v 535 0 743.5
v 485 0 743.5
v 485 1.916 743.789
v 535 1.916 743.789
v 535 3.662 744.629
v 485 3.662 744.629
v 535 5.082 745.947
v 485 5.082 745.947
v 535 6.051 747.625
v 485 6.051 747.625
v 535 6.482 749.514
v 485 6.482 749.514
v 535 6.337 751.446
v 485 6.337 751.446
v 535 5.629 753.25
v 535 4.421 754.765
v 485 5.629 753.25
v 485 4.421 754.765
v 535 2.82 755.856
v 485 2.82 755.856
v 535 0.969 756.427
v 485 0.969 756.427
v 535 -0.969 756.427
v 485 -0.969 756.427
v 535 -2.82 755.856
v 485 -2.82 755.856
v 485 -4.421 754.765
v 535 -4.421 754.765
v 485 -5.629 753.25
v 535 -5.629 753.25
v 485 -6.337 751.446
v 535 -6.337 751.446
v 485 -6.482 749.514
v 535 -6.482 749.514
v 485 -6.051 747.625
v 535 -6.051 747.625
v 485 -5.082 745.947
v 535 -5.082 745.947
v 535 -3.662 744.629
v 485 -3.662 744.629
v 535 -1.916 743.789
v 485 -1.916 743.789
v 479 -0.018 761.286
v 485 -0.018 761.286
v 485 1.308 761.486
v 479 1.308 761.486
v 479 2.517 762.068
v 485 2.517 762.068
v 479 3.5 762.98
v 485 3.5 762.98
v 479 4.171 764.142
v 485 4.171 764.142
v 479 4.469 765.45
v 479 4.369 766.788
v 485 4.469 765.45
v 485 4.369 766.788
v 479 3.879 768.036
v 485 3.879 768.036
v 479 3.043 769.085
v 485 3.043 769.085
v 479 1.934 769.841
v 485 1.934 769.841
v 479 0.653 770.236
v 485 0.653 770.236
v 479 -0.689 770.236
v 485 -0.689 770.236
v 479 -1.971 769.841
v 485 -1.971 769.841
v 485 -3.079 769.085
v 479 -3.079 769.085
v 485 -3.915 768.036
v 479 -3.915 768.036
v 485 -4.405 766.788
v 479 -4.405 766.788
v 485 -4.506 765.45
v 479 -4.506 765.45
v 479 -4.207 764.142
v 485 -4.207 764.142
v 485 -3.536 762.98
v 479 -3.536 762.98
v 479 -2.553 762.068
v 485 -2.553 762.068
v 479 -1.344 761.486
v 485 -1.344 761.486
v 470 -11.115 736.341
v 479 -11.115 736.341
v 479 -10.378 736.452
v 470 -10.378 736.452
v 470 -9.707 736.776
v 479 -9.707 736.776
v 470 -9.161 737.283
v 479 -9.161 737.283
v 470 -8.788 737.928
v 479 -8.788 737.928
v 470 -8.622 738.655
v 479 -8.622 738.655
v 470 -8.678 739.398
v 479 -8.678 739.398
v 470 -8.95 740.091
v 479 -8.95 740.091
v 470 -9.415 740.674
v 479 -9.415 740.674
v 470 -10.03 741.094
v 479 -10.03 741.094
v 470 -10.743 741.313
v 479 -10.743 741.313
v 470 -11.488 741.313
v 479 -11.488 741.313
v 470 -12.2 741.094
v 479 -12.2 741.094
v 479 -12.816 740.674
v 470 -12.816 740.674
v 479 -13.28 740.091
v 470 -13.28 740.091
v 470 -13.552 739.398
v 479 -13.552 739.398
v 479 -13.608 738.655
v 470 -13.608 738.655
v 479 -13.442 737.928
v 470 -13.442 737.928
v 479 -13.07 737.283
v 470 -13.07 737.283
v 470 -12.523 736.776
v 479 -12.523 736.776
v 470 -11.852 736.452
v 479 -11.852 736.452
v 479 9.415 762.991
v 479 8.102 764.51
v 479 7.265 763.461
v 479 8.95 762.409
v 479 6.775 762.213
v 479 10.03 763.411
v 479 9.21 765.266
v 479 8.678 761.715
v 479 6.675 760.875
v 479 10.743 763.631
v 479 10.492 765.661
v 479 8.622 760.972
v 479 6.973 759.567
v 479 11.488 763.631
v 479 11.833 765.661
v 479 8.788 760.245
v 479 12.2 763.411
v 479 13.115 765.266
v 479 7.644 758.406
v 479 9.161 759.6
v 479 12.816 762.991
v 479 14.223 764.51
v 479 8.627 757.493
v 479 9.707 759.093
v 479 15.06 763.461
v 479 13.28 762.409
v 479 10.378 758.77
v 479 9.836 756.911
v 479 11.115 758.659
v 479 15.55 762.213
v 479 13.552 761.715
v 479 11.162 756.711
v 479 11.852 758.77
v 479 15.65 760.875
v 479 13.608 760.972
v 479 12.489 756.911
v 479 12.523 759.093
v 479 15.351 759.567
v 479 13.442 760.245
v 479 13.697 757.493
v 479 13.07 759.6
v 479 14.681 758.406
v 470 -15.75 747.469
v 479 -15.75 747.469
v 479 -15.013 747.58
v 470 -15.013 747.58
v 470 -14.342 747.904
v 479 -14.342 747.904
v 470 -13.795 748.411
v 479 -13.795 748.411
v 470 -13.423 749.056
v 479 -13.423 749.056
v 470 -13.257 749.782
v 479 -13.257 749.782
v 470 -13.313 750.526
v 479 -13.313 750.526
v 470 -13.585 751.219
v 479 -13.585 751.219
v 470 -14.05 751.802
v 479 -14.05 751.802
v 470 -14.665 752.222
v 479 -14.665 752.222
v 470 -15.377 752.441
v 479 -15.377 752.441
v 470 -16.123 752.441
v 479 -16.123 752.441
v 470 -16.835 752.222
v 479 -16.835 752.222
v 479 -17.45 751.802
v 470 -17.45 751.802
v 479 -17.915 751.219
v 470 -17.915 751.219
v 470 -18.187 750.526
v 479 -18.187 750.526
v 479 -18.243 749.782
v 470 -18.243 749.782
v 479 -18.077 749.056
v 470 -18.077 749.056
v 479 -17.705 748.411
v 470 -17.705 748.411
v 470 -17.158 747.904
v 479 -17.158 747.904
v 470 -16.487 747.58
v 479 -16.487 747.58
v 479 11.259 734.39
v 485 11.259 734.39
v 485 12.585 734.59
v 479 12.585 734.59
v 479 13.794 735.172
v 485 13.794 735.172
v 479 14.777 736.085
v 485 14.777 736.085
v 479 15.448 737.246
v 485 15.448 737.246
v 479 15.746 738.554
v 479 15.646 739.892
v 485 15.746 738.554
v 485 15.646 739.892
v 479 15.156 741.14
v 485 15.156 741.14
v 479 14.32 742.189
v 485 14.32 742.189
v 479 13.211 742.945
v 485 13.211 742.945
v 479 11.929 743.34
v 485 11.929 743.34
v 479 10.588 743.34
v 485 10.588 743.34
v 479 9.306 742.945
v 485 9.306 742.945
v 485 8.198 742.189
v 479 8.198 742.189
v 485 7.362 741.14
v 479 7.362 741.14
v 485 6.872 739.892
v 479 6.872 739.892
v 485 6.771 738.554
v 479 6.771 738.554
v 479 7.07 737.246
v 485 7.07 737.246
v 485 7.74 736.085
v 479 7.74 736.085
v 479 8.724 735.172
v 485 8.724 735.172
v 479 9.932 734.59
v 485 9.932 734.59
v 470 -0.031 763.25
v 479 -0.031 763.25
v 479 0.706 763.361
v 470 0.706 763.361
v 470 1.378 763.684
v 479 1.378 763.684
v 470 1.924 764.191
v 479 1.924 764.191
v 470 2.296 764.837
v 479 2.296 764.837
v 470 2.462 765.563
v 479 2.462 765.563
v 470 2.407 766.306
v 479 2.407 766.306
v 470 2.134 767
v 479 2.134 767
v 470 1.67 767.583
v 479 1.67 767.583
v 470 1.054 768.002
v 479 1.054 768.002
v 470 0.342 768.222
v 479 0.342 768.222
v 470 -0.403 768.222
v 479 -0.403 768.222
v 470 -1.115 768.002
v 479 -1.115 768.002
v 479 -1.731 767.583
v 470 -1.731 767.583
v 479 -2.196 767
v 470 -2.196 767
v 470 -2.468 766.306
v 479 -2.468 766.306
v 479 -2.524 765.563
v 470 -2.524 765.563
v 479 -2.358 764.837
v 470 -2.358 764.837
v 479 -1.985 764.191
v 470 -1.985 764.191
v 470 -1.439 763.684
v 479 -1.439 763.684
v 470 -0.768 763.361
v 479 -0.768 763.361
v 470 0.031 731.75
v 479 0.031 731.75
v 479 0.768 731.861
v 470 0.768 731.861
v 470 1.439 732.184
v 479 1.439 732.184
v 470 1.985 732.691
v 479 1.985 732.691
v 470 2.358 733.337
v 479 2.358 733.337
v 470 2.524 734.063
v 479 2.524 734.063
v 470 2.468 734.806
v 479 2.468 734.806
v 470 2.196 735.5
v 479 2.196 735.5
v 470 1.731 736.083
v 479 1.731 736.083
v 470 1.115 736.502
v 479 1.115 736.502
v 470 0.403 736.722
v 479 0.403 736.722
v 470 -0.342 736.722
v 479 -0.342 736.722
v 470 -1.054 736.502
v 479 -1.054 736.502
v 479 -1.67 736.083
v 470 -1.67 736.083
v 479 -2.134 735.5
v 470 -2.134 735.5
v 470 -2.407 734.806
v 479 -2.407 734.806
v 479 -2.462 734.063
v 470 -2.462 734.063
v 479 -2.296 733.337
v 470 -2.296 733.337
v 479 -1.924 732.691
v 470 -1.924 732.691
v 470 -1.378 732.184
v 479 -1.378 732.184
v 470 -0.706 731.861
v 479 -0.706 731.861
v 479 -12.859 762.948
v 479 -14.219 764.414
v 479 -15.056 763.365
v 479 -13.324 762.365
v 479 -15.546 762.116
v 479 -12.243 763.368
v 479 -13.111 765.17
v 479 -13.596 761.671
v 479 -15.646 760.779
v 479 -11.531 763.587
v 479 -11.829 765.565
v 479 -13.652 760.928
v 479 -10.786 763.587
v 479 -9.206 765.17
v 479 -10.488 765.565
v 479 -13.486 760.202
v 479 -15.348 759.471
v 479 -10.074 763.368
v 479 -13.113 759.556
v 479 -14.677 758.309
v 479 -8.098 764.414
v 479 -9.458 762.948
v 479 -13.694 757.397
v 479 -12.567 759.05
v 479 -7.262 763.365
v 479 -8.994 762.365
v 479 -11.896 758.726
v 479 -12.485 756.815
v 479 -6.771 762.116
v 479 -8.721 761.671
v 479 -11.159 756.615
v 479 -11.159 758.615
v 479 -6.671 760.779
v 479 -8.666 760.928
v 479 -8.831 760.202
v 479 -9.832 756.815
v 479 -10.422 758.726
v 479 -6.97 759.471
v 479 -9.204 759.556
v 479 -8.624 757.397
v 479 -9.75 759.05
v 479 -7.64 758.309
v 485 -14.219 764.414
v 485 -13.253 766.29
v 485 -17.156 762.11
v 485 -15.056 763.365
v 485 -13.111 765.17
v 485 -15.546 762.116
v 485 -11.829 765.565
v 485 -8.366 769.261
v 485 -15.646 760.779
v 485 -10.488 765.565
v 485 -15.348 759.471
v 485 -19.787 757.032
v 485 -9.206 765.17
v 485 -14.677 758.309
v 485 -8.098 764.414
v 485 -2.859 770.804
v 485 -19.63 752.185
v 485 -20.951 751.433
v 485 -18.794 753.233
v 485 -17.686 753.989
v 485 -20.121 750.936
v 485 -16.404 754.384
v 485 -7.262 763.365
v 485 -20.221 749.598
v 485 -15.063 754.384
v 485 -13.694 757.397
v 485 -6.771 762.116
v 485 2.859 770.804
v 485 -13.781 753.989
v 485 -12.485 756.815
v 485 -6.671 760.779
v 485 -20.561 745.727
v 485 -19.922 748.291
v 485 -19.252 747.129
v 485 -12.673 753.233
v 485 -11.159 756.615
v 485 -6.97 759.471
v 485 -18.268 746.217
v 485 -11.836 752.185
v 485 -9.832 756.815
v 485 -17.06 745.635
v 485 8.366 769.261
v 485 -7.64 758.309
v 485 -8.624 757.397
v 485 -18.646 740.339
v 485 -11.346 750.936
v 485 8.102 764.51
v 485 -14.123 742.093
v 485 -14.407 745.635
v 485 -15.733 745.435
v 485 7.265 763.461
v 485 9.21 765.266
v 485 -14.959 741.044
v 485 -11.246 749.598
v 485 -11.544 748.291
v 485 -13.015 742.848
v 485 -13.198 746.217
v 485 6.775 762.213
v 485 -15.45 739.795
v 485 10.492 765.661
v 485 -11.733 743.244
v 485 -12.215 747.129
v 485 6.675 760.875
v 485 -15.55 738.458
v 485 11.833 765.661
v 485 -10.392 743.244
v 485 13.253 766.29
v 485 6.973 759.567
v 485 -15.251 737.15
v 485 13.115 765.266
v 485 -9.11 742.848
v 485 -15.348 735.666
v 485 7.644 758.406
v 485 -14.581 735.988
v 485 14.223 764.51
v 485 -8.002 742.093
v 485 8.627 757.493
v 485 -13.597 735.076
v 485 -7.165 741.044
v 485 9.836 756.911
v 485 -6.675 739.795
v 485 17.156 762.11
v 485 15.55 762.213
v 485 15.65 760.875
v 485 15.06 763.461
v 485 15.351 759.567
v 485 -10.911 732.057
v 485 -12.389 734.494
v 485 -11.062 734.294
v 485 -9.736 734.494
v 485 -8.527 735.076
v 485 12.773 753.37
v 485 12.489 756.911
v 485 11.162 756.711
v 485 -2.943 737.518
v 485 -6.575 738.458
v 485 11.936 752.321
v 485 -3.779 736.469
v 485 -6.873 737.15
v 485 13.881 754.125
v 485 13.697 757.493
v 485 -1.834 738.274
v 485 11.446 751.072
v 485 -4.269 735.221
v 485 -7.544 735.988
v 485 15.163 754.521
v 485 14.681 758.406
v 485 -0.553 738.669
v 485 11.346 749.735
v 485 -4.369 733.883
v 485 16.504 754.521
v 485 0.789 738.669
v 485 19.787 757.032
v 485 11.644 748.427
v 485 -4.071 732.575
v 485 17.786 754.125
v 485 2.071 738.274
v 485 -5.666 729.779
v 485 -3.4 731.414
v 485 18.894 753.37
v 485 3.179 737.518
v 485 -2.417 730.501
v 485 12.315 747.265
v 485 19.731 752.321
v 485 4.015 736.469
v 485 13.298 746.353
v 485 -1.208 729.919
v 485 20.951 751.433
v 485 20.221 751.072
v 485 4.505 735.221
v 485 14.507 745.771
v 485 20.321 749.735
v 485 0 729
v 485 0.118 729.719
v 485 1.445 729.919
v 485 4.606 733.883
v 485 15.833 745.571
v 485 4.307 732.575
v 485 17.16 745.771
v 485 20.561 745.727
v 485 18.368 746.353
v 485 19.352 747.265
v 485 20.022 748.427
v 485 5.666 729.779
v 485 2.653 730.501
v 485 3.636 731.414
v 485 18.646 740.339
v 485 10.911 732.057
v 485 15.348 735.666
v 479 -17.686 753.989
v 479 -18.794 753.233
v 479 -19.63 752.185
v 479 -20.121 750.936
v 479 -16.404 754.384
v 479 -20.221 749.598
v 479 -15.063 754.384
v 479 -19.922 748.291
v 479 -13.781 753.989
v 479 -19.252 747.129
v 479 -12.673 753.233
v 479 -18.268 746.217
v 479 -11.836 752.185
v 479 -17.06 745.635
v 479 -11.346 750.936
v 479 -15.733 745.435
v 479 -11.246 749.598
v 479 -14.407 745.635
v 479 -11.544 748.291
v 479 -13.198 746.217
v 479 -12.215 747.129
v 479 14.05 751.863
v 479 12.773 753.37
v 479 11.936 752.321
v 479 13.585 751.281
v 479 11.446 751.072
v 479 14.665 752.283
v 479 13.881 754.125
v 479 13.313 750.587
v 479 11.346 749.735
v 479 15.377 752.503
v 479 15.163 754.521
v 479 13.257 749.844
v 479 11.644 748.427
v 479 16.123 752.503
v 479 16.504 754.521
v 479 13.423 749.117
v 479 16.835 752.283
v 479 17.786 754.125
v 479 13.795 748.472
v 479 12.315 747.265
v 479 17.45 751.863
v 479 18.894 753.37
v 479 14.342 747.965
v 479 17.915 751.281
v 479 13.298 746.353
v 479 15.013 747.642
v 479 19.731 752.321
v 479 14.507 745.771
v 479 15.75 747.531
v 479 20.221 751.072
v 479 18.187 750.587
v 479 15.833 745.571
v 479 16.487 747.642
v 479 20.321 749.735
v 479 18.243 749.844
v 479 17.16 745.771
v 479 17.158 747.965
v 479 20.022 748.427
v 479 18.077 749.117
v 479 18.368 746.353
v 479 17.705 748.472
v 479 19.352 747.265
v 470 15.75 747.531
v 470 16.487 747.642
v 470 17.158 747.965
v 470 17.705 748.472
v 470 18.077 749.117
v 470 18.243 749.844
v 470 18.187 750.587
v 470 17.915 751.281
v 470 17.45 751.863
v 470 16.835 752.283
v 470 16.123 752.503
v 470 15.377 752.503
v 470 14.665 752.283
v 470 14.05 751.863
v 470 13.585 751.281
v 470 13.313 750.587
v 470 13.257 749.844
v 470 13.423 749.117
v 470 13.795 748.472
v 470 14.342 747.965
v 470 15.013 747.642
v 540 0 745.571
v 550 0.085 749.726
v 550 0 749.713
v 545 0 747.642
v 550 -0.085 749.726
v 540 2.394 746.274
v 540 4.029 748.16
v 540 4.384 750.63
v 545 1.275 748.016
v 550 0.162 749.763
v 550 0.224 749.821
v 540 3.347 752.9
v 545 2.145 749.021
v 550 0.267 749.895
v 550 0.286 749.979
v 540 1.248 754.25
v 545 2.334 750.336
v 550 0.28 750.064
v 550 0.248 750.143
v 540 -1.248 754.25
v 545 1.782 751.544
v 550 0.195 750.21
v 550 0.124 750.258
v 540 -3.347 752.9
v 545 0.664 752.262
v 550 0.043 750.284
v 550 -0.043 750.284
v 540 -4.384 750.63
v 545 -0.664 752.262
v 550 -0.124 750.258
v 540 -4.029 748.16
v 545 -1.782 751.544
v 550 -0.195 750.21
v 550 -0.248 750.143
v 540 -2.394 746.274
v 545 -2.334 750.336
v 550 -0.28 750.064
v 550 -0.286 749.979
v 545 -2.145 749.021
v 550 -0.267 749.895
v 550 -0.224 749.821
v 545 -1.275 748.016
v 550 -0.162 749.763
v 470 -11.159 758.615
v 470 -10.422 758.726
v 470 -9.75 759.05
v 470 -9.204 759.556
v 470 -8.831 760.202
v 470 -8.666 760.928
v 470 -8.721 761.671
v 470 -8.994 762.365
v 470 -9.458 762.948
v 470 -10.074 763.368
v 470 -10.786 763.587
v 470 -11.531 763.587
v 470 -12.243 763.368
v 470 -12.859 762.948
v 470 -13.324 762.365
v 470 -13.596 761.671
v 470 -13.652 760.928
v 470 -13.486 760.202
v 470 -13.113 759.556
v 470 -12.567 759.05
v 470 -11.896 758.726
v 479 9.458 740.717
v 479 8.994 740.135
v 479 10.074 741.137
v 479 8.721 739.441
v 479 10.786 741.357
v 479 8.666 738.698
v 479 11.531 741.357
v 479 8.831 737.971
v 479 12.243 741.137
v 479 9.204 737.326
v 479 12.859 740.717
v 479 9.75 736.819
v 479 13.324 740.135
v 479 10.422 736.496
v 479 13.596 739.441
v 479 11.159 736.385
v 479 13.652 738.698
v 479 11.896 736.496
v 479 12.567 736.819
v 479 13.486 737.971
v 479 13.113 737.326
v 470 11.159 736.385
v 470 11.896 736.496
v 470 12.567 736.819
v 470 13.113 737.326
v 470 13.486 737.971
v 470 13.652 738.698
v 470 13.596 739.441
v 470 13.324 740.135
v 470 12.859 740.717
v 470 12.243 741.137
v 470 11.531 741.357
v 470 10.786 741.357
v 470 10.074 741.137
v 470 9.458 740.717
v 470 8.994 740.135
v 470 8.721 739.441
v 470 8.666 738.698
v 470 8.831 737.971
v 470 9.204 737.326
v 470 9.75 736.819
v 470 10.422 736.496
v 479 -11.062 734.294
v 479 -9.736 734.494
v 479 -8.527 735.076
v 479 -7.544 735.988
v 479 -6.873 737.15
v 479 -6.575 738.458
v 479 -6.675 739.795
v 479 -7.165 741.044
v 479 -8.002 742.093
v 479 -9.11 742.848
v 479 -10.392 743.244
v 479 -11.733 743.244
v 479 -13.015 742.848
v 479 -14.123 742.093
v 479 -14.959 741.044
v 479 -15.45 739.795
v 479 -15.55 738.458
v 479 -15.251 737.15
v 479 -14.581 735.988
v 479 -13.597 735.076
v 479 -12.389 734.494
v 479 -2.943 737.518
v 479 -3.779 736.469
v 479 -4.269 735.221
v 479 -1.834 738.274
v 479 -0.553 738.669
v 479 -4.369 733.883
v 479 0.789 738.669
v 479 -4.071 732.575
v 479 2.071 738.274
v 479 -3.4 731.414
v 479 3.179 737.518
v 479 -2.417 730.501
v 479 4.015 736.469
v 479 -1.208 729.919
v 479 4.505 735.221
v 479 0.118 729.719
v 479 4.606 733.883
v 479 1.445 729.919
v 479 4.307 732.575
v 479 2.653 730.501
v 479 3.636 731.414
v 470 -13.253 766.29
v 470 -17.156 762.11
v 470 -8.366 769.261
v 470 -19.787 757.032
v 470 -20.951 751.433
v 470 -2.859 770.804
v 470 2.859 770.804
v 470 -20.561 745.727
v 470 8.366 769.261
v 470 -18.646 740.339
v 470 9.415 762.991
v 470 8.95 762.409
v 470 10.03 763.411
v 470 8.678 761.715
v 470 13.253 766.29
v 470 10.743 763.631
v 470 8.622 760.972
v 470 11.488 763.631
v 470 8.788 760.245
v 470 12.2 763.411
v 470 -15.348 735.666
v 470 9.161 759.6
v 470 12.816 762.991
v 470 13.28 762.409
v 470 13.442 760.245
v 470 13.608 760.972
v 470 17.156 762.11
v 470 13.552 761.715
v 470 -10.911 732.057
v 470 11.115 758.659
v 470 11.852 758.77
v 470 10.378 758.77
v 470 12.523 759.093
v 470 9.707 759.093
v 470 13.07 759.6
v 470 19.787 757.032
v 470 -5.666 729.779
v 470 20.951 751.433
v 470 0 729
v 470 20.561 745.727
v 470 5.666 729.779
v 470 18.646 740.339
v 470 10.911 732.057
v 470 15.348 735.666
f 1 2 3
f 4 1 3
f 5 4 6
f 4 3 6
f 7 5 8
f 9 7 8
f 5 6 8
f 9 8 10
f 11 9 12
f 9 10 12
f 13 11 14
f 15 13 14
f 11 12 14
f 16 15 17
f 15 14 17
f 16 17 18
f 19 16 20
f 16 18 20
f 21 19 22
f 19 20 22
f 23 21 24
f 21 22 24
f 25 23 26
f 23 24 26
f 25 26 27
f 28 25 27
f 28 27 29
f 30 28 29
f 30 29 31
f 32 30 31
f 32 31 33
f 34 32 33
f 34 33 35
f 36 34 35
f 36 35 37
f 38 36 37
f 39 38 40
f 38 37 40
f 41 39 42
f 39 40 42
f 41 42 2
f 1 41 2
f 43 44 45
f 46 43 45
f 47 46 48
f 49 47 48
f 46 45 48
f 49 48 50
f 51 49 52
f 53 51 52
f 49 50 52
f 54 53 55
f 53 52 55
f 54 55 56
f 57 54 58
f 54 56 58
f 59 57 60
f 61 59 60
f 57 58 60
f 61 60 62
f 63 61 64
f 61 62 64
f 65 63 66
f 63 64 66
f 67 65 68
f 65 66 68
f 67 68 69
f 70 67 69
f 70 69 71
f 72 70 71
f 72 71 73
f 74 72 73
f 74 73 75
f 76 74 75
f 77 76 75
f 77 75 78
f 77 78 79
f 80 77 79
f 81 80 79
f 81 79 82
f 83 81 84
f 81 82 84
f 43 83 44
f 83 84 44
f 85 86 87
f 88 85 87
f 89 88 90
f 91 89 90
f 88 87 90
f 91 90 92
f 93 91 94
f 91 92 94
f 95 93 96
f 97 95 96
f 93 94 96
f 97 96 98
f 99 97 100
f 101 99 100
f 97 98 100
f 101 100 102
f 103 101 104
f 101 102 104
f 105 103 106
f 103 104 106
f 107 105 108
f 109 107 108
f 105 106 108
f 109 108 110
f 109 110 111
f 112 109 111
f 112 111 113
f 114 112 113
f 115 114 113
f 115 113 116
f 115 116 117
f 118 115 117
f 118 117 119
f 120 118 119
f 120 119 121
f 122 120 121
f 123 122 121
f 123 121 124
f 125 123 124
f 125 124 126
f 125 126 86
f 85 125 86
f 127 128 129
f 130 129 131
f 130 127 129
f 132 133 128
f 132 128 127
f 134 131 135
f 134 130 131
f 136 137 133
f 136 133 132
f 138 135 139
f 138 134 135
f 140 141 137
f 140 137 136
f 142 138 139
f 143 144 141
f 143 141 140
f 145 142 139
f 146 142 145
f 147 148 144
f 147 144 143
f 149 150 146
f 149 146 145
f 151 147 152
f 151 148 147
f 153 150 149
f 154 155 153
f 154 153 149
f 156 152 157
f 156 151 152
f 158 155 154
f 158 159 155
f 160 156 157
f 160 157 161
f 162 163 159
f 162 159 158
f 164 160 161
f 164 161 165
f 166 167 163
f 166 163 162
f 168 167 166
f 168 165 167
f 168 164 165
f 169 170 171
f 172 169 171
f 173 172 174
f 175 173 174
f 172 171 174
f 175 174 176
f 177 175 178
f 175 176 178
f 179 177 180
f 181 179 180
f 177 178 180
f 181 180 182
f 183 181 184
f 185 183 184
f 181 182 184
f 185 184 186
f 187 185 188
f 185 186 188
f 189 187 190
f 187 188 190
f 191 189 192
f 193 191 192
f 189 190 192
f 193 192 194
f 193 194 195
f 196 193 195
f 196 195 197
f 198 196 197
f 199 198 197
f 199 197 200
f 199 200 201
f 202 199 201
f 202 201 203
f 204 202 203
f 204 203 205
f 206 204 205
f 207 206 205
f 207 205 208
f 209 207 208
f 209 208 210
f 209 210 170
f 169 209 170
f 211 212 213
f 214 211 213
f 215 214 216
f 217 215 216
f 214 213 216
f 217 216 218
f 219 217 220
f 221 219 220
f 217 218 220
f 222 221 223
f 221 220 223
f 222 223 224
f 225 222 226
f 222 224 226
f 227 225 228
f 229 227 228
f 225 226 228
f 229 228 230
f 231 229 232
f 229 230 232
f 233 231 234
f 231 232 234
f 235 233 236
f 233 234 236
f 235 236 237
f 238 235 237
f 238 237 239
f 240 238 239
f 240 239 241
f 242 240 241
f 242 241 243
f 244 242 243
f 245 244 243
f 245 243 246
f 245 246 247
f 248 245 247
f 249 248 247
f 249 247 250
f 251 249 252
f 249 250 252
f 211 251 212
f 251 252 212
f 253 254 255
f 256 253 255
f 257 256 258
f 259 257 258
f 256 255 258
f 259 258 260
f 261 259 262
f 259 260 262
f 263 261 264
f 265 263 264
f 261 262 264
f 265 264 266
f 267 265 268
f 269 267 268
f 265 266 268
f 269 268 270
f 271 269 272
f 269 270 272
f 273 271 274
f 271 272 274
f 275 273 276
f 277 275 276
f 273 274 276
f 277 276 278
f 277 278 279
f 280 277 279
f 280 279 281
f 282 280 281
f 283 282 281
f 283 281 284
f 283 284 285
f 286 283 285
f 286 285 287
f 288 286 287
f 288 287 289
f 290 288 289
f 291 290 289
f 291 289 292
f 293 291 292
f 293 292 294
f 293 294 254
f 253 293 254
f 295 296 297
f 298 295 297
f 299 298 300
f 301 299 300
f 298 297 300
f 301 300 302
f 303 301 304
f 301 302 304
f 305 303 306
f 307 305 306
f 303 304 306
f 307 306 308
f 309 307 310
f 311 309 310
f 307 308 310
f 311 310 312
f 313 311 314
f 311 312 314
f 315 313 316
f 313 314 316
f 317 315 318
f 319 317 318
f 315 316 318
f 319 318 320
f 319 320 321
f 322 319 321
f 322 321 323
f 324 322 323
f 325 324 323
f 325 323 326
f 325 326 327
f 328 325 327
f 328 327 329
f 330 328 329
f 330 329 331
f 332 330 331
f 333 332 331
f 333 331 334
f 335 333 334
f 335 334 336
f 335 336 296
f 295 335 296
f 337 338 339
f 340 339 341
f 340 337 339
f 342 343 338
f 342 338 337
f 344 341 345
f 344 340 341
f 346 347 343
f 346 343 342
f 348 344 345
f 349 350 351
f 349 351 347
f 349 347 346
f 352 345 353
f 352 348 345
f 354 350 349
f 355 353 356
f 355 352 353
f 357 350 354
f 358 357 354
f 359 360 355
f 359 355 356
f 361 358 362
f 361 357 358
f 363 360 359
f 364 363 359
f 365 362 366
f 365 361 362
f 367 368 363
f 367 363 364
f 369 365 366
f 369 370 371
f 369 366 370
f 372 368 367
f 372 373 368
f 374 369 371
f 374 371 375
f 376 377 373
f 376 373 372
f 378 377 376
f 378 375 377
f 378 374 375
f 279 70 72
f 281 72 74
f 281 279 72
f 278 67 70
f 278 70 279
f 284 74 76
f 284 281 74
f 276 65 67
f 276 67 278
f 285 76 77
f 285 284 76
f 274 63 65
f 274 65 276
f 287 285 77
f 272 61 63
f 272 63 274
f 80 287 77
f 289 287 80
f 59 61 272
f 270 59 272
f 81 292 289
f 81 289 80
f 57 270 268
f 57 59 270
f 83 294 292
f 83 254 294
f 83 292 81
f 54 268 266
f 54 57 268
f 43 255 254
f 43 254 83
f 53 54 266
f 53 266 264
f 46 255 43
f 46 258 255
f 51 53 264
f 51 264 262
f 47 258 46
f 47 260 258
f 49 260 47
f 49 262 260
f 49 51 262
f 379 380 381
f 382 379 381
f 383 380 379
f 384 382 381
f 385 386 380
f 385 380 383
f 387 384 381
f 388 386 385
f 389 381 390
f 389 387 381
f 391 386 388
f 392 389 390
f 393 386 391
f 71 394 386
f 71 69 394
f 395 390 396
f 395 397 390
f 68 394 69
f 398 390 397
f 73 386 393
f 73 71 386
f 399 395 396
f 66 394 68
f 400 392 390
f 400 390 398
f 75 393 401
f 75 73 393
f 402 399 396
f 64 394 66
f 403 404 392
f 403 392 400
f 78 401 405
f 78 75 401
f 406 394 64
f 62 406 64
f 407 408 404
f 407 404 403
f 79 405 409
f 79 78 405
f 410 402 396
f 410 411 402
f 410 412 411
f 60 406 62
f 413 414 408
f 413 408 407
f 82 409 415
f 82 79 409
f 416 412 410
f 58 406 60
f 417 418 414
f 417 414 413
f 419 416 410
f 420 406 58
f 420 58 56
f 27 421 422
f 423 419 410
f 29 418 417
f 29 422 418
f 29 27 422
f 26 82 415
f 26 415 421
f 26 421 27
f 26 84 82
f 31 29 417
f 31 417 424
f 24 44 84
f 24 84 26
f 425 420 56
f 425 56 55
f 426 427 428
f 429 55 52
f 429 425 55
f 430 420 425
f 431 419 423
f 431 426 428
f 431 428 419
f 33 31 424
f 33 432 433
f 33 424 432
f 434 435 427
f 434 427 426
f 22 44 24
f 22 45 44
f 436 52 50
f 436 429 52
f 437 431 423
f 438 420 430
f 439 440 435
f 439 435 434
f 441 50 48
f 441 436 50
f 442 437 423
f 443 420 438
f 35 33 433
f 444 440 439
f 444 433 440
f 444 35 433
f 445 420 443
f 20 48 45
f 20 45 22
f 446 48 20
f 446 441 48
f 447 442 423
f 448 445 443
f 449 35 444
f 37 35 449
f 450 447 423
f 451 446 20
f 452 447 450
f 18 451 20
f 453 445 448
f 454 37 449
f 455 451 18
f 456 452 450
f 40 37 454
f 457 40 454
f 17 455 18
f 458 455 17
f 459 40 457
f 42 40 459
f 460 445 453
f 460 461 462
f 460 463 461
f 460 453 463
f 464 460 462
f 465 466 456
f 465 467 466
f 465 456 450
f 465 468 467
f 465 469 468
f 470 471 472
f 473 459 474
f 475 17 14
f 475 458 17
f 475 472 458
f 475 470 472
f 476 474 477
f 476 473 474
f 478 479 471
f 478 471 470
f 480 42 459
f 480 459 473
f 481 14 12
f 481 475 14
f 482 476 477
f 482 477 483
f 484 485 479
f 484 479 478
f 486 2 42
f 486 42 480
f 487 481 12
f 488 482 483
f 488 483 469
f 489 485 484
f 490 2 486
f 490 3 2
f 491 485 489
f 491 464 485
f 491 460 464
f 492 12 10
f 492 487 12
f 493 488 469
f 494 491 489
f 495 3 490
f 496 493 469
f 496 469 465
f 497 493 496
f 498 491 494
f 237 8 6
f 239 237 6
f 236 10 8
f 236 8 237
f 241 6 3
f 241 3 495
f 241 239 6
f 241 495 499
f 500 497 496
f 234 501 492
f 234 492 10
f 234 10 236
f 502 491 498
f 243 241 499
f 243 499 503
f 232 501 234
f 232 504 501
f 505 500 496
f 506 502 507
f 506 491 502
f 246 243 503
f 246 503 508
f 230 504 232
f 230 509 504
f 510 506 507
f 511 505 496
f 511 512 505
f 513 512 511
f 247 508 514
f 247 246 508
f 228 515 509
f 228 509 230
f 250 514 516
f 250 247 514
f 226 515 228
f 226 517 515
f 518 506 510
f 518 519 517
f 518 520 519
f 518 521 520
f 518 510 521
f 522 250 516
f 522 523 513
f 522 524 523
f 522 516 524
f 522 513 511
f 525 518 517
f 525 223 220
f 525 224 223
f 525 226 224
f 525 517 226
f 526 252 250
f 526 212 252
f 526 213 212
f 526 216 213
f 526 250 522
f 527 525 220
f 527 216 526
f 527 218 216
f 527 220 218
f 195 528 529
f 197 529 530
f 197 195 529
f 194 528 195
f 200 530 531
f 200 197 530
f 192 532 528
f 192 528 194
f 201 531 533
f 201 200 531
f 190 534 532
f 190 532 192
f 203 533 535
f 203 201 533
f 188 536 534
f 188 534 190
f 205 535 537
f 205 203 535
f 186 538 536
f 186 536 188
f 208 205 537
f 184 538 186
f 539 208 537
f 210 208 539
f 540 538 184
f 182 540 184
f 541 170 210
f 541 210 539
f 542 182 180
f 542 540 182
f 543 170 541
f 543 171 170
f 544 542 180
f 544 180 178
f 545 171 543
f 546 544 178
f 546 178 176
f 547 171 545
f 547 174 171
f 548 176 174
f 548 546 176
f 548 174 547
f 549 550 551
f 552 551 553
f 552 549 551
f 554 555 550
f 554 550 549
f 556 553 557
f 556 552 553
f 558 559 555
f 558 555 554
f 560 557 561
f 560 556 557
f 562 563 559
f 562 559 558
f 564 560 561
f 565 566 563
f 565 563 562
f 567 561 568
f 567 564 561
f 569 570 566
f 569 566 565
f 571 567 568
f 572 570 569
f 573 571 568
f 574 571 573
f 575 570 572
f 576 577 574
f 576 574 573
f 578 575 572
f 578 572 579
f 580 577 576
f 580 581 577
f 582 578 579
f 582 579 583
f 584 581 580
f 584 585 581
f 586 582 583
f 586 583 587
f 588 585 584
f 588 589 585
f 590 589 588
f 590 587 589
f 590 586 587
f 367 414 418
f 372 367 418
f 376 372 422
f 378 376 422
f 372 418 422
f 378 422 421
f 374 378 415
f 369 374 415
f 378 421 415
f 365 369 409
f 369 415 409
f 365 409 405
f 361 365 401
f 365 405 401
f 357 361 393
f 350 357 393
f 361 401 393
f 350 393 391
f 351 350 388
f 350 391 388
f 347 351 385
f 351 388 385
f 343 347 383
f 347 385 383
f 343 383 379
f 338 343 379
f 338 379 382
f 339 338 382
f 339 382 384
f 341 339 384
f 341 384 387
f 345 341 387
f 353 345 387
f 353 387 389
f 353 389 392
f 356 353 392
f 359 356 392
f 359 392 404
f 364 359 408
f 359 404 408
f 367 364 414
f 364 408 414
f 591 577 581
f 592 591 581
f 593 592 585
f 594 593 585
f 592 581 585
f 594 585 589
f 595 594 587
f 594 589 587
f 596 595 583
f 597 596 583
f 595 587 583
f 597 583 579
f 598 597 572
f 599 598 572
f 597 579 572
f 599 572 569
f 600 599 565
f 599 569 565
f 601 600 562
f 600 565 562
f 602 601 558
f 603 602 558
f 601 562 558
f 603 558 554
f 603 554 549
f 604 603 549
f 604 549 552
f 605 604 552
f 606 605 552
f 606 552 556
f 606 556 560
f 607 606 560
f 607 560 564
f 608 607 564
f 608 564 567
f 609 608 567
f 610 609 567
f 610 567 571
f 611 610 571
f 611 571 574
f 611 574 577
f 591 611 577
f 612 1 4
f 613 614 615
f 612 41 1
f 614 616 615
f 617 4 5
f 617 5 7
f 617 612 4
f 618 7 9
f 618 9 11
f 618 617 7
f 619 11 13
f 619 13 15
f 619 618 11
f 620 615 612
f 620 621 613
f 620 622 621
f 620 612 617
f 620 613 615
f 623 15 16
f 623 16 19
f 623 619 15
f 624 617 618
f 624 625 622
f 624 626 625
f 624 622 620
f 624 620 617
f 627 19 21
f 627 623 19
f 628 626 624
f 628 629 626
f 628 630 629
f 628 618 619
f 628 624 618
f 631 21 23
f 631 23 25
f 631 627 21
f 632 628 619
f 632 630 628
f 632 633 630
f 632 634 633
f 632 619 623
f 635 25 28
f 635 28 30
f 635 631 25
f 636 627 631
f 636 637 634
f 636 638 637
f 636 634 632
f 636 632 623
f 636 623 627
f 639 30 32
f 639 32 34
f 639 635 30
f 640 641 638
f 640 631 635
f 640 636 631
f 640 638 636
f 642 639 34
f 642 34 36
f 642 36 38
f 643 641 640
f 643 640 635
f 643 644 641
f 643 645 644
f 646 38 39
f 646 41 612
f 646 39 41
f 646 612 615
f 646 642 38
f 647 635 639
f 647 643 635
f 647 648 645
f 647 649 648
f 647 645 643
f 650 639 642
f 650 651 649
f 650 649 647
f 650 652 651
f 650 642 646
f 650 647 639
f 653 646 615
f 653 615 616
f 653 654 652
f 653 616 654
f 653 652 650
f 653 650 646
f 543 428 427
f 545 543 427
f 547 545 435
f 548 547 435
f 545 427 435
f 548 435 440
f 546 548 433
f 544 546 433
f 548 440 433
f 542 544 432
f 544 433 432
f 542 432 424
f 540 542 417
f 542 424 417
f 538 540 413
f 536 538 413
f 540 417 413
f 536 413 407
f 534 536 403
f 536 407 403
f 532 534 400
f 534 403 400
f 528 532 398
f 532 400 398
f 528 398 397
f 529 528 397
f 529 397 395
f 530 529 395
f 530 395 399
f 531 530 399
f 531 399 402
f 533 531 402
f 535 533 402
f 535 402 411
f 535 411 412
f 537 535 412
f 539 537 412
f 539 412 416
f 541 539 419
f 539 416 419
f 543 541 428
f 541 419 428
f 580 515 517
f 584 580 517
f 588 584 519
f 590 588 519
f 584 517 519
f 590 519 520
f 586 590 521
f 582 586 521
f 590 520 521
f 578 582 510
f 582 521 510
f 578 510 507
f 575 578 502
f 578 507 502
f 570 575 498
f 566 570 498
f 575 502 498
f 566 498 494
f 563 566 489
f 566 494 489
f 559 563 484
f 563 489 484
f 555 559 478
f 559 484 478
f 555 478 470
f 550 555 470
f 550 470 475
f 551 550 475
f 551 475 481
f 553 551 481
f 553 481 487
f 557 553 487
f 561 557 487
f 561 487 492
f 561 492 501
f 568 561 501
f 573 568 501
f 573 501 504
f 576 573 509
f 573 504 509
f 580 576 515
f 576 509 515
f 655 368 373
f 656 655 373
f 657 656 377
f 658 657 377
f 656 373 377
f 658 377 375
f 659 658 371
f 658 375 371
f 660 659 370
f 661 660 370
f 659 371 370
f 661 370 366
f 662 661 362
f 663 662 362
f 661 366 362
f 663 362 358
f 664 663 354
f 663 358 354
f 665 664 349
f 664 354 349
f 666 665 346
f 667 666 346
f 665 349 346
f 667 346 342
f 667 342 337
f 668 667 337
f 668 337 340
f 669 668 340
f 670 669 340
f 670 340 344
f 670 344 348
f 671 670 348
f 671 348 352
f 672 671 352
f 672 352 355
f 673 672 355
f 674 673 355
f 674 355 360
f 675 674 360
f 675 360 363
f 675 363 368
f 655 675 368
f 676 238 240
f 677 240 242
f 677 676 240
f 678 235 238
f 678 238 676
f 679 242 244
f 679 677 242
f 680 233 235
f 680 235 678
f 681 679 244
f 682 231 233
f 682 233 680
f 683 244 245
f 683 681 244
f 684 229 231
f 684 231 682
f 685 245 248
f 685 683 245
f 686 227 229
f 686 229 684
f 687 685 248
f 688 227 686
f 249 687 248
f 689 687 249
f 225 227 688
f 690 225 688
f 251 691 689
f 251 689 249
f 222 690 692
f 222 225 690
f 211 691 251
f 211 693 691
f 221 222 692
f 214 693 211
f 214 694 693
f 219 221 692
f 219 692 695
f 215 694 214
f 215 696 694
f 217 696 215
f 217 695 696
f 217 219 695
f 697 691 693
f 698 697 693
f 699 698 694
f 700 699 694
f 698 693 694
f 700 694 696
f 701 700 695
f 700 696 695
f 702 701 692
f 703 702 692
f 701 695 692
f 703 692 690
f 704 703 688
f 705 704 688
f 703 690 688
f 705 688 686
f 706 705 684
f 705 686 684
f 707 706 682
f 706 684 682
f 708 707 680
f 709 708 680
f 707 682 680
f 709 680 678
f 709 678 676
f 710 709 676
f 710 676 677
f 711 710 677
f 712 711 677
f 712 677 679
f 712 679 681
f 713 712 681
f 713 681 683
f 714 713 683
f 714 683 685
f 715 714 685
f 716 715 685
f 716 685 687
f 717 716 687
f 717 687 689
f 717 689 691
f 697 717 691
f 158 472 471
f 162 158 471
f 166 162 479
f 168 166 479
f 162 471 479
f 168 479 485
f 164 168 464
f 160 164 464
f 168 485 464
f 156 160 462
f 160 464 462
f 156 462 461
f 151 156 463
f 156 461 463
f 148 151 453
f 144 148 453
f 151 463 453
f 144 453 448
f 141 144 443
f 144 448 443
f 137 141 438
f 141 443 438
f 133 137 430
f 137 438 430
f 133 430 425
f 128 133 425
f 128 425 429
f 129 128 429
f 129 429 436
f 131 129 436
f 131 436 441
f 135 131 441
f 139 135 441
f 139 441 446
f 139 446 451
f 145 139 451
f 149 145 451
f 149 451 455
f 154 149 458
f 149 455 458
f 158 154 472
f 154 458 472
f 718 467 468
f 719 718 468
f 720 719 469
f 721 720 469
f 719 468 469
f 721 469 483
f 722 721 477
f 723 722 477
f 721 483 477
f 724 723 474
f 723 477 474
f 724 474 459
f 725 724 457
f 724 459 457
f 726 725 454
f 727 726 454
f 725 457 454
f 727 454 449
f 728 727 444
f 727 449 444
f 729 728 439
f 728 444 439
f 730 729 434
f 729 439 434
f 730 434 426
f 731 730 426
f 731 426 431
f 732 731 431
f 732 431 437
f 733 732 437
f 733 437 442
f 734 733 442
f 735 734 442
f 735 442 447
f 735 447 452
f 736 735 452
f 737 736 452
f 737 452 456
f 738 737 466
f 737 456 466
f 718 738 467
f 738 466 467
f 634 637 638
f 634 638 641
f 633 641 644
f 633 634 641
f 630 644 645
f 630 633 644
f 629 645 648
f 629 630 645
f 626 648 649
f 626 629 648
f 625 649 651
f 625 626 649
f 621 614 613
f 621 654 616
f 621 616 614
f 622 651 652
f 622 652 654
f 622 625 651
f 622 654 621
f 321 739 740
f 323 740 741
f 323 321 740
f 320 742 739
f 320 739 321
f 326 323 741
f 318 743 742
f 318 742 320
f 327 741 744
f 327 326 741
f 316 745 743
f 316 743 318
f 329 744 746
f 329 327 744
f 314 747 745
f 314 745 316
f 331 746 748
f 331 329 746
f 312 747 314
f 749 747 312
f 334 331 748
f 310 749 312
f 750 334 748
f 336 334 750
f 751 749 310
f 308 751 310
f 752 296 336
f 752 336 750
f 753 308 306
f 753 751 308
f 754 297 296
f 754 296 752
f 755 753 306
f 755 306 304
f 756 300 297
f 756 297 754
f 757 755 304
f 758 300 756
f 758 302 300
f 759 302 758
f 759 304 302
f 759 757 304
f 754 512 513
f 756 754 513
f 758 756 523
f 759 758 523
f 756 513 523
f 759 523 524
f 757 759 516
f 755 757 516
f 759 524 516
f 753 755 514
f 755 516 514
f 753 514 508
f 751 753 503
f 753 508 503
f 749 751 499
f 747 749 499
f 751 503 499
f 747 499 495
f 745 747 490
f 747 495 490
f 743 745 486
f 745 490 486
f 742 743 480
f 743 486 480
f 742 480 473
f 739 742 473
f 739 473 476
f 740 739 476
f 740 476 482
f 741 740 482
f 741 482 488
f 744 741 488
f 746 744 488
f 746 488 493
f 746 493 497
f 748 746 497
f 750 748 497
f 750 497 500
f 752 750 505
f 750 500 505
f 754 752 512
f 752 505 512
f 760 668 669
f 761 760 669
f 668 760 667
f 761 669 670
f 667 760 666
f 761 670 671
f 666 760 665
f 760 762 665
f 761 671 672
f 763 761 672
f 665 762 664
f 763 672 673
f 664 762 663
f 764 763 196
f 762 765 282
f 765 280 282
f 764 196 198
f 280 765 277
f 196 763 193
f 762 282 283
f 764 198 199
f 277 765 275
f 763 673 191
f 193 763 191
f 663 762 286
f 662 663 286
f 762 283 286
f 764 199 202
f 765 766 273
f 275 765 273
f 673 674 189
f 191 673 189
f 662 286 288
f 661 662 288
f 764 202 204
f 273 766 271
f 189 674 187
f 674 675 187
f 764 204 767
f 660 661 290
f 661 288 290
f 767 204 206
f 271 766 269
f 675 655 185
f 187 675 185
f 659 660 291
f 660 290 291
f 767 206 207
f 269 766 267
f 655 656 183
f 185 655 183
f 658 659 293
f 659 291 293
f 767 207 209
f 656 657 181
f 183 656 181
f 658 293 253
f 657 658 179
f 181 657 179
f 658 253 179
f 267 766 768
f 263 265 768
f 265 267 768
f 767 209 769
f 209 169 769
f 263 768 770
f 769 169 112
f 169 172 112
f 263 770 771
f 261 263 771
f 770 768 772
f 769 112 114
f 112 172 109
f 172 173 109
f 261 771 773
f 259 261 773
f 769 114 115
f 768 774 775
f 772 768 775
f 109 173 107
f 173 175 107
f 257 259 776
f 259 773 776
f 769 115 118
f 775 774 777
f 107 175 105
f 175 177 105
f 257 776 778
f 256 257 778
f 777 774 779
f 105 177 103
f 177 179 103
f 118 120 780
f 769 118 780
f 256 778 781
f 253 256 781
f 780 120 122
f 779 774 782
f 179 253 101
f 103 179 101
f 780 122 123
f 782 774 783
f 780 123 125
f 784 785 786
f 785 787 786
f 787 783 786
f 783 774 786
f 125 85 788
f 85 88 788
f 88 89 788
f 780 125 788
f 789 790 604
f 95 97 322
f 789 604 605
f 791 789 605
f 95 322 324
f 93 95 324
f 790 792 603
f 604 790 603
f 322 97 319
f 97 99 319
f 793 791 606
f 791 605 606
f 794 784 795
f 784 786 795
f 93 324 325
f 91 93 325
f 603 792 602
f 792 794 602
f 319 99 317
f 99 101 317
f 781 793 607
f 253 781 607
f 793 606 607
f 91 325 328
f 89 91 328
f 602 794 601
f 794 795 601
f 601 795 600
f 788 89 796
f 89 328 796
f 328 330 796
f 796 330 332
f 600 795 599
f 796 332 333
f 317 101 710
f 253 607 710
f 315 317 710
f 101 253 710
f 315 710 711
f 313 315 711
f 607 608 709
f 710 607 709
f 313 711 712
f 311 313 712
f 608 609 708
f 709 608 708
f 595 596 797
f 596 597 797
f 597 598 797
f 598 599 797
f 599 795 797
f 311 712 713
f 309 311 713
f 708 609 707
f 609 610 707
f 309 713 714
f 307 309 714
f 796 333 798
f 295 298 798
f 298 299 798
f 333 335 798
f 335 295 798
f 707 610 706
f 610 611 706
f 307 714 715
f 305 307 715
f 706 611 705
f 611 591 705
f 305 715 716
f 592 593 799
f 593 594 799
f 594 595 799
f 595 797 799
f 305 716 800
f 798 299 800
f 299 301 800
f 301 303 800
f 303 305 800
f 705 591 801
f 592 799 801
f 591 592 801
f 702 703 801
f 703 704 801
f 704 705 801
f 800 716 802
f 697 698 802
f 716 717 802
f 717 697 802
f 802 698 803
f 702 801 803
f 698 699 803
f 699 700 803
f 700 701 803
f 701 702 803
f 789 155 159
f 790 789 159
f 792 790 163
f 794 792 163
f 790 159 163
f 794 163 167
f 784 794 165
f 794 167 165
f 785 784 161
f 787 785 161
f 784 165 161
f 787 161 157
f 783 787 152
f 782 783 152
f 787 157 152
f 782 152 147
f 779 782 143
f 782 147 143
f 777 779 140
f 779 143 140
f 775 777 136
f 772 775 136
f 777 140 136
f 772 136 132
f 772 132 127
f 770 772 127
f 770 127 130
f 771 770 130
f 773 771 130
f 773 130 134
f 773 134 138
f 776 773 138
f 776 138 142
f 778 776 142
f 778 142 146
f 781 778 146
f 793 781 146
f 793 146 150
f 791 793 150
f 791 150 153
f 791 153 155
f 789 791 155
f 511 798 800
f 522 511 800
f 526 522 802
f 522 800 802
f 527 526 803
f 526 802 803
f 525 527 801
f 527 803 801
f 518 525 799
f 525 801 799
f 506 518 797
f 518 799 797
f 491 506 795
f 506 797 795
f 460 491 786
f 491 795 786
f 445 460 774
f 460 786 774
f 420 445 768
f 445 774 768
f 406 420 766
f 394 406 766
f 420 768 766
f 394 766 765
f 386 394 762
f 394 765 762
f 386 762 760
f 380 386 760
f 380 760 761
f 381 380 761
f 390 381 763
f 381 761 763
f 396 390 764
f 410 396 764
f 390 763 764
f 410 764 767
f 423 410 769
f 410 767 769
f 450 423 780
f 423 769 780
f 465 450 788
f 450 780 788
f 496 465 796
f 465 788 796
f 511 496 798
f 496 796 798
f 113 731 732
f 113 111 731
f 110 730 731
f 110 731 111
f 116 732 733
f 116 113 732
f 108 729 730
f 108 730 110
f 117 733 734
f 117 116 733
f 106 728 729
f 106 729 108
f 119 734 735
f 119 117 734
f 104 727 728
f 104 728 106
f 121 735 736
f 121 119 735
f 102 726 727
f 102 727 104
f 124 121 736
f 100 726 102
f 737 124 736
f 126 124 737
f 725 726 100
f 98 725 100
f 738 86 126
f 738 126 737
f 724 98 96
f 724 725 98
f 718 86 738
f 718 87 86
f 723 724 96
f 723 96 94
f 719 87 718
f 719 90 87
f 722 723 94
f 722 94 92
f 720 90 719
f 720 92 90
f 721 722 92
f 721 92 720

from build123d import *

# Parameters (mm, degrees)
ESBO_O1_R                = 21
RESSALTO_EXTRUS_O1_DEPTH = 15
ESBO_O2_R                = 6.5
RESSALTO_EXTRUS_O2_DEPTH = 65
CHANFRO1_SIZE            = 15
CHANFRO1_SIZE2           = 6.213203436
ESBO_O3_R                = 2.5
CORTE_EXTRUS_O2_DEPTH    = 4000
ESBO_O3_3_R              = 4.5
ESBO_O3_3_R_2            = 2.5
CORTE_EXTRUS_O3_DEPTH    = 6


with BuildPart() as part:
    # Esboço1 → Ressalto-extrusão1 (new body)
    with BuildSketch(Plane(origin=(470, 0, 0), x_dir=(0, 0, -1), z_dir=(1, 0, 0))):
        with Locations((-750, 0)):
            Circle(ESBO_O1_R)
    extrude(amount=RESSALTO_EXTRUS_O1_DEPTH)

    # Esboço2 → Ressalto-extrusão2 (add)
    with BuildSketch(Plane(origin=(485, 0, 0), x_dir=(0, 0, -1), z_dir=(1, 0, 0))):
        with Locations((-750, 0)):
            Circle(ESBO_O2_R)
    extrude(amount=RESSALTO_EXTRUS_O2_DEPTH)

    # Chanfro1
    chanfro1_edges = [part.edges().sort_by_distance(p)[0] for p in [
        (550, 0, 756.5),
    ]]
    chanfro1_side = [part.faces().sort_by_distance(p)[0] for p in [
        (517.5, 0, 756.5),
    ]]
    chamfer(chanfro1_edges, length=CHANFRO1_SIZE, length2=CHANFRO1_SIZE2, reference=chanfro1_side[0])

    # Esboço3 → Corte-extrusão2 (cut)
    with BuildSketch(Plane(origin=(485, 0, 0), x_dir=(0, 0, -1), z_dir=(1, 0, 0))):
        with Locations((-738.884845661, 11.158666767)):
            Circle(ESBO_O3_R)
        with Locations((-734.250030053, 0.030767933)):
            Circle(ESBO_O3_R)
        with Locations((-738.841333233, -11.115154339)):
            Circle(ESBO_O3_R)
        with Locations((-749.969232067, -15.749969947)):
            Circle(ESBO_O3_R)
        with Locations((-761.115154339, -11.158666767)):
            Circle(ESBO_O3_R)
        with Locations((-765.749969947, -0.030767933)):
            Circle(ESBO_O3_R)
        with Locations((-761.158666767, 11.115154339)):
            Circle(ESBO_O3_R)
        with Locations((-750.030767933, 15.749969947)):
            Circle(ESBO_O3_R)
    extrude(amount=-CORTE_EXTRUS_O2_DEPTH, mode=Mode.SUBTRACT)

    # Esboço3<3> → Corte-extrusão3 (cut)
    # profile 1 of 8: a face of its own
    with BuildSketch(Plane(origin=(485, 0, 0), x_dir=(0, 0, -1), z_dir=(1, 0, 0))):
        with Locations((-765.786166925, -0.018086598)):
            Circle(ESBO_O3_3_R)
        with Locations((-765.749969947, -0.030767933)):
            Circle(ESBO_O3_3_R_2, mode=Mode.SUBTRACT)
    # profile 2 of 8: a face of its own
    with BuildSketch(Plane(origin=(485, 0, 0), x_dir=(0, 0, -1), z_dir=(1, 0, 0))):
        with Locations((-761.115154339, -11.158666767)):
            Circle(ESBO_O3_3_R)
        with Locations((-761.115154339, -11.158666767)):
            Circle(ESBO_O3_3_R_2, mode=Mode.SUBTRACT)
    # profile 3 of 8: a face of its own
    with BuildSketch(Plane(origin=(485, 0, 0), x_dir=(0, 0, -1), z_dir=(1, 0, 0))):
        with Locations((-761.211491815, 11.16239786)):
            Circle(ESBO_O3_3_R)
        with Locations((-761.158666767, 11.115154339)):
            Circle(ESBO_O3_3_R_2, mode=Mode.SUBTRACT)
    # profile 4 of 8: a face of its own
    with BuildSketch(Plane(origin=(485, 0, 0), x_dir=(0, 0, -1), z_dir=(1, 0, 0))):
        with Locations((-750.070911646, 15.833410446)):
            Circle(ESBO_O3_3_R)
        with Locations((-750.030767933, 15.749969947)):
            Circle(ESBO_O3_3_R_2, mode=Mode.SUBTRACT)
    # profile 5 of 8: a face of its own
    with BuildSketch(Plane(origin=(485, 0, 0), x_dir=(0, 0, -1), z_dir=(1, 0, 0))):
        with Locations((-738.890427188, 11.258735336)):
            Circle(ESBO_O3_3_R)
        with Locations((-738.884845661, 11.158666767)):
            Circle(ESBO_O3_3_R_2, mode=Mode.SUBTRACT)
    # profile 6 of 8: a face of its own
    with BuildSketch(Plane(origin=(485, 0, 0), x_dir=(0, 0, -1), z_dir=(1, 0, 0))):
        with Locations((-734.219414603, 0.118155167)):
            Circle(ESBO_O3_3_R)
        with Locations((-734.250030053, 0.030767933)):
            Circle(ESBO_O3_3_R_2, mode=Mode.SUBTRACT)
    # profile 7 of 8: a face of its own
    with BuildSketch(Plane(origin=(485, 0, 0), x_dir=(0, 0, -1), z_dir=(1, 0, 0))):
        with Locations((-738.794089712, -11.062329291)):
            Circle(ESBO_O3_3_R)
        with Locations((-738.841333233, -11.115154339)):
            Circle(ESBO_O3_3_R_2, mode=Mode.SUBTRACT)
    # profile 8 of 8: a face of its own
    with BuildSketch(Plane(origin=(485, 0, 0), x_dir=(0, 0, -1), z_dir=(1, 0, 0))):
        with Locations((-749.934669881, -15.733341876)):
            Circle(ESBO_O3_3_R)
        with Locations((-749.969232067, -15.749969947)):
            Circle(ESBO_O3_3_R_2, mode=Mode.SUBTRACT)
    extrude(amount=-CORTE_EXTRUS_O3_DEPTH, mode=Mode.SUBTRACT)


solid = part.part
